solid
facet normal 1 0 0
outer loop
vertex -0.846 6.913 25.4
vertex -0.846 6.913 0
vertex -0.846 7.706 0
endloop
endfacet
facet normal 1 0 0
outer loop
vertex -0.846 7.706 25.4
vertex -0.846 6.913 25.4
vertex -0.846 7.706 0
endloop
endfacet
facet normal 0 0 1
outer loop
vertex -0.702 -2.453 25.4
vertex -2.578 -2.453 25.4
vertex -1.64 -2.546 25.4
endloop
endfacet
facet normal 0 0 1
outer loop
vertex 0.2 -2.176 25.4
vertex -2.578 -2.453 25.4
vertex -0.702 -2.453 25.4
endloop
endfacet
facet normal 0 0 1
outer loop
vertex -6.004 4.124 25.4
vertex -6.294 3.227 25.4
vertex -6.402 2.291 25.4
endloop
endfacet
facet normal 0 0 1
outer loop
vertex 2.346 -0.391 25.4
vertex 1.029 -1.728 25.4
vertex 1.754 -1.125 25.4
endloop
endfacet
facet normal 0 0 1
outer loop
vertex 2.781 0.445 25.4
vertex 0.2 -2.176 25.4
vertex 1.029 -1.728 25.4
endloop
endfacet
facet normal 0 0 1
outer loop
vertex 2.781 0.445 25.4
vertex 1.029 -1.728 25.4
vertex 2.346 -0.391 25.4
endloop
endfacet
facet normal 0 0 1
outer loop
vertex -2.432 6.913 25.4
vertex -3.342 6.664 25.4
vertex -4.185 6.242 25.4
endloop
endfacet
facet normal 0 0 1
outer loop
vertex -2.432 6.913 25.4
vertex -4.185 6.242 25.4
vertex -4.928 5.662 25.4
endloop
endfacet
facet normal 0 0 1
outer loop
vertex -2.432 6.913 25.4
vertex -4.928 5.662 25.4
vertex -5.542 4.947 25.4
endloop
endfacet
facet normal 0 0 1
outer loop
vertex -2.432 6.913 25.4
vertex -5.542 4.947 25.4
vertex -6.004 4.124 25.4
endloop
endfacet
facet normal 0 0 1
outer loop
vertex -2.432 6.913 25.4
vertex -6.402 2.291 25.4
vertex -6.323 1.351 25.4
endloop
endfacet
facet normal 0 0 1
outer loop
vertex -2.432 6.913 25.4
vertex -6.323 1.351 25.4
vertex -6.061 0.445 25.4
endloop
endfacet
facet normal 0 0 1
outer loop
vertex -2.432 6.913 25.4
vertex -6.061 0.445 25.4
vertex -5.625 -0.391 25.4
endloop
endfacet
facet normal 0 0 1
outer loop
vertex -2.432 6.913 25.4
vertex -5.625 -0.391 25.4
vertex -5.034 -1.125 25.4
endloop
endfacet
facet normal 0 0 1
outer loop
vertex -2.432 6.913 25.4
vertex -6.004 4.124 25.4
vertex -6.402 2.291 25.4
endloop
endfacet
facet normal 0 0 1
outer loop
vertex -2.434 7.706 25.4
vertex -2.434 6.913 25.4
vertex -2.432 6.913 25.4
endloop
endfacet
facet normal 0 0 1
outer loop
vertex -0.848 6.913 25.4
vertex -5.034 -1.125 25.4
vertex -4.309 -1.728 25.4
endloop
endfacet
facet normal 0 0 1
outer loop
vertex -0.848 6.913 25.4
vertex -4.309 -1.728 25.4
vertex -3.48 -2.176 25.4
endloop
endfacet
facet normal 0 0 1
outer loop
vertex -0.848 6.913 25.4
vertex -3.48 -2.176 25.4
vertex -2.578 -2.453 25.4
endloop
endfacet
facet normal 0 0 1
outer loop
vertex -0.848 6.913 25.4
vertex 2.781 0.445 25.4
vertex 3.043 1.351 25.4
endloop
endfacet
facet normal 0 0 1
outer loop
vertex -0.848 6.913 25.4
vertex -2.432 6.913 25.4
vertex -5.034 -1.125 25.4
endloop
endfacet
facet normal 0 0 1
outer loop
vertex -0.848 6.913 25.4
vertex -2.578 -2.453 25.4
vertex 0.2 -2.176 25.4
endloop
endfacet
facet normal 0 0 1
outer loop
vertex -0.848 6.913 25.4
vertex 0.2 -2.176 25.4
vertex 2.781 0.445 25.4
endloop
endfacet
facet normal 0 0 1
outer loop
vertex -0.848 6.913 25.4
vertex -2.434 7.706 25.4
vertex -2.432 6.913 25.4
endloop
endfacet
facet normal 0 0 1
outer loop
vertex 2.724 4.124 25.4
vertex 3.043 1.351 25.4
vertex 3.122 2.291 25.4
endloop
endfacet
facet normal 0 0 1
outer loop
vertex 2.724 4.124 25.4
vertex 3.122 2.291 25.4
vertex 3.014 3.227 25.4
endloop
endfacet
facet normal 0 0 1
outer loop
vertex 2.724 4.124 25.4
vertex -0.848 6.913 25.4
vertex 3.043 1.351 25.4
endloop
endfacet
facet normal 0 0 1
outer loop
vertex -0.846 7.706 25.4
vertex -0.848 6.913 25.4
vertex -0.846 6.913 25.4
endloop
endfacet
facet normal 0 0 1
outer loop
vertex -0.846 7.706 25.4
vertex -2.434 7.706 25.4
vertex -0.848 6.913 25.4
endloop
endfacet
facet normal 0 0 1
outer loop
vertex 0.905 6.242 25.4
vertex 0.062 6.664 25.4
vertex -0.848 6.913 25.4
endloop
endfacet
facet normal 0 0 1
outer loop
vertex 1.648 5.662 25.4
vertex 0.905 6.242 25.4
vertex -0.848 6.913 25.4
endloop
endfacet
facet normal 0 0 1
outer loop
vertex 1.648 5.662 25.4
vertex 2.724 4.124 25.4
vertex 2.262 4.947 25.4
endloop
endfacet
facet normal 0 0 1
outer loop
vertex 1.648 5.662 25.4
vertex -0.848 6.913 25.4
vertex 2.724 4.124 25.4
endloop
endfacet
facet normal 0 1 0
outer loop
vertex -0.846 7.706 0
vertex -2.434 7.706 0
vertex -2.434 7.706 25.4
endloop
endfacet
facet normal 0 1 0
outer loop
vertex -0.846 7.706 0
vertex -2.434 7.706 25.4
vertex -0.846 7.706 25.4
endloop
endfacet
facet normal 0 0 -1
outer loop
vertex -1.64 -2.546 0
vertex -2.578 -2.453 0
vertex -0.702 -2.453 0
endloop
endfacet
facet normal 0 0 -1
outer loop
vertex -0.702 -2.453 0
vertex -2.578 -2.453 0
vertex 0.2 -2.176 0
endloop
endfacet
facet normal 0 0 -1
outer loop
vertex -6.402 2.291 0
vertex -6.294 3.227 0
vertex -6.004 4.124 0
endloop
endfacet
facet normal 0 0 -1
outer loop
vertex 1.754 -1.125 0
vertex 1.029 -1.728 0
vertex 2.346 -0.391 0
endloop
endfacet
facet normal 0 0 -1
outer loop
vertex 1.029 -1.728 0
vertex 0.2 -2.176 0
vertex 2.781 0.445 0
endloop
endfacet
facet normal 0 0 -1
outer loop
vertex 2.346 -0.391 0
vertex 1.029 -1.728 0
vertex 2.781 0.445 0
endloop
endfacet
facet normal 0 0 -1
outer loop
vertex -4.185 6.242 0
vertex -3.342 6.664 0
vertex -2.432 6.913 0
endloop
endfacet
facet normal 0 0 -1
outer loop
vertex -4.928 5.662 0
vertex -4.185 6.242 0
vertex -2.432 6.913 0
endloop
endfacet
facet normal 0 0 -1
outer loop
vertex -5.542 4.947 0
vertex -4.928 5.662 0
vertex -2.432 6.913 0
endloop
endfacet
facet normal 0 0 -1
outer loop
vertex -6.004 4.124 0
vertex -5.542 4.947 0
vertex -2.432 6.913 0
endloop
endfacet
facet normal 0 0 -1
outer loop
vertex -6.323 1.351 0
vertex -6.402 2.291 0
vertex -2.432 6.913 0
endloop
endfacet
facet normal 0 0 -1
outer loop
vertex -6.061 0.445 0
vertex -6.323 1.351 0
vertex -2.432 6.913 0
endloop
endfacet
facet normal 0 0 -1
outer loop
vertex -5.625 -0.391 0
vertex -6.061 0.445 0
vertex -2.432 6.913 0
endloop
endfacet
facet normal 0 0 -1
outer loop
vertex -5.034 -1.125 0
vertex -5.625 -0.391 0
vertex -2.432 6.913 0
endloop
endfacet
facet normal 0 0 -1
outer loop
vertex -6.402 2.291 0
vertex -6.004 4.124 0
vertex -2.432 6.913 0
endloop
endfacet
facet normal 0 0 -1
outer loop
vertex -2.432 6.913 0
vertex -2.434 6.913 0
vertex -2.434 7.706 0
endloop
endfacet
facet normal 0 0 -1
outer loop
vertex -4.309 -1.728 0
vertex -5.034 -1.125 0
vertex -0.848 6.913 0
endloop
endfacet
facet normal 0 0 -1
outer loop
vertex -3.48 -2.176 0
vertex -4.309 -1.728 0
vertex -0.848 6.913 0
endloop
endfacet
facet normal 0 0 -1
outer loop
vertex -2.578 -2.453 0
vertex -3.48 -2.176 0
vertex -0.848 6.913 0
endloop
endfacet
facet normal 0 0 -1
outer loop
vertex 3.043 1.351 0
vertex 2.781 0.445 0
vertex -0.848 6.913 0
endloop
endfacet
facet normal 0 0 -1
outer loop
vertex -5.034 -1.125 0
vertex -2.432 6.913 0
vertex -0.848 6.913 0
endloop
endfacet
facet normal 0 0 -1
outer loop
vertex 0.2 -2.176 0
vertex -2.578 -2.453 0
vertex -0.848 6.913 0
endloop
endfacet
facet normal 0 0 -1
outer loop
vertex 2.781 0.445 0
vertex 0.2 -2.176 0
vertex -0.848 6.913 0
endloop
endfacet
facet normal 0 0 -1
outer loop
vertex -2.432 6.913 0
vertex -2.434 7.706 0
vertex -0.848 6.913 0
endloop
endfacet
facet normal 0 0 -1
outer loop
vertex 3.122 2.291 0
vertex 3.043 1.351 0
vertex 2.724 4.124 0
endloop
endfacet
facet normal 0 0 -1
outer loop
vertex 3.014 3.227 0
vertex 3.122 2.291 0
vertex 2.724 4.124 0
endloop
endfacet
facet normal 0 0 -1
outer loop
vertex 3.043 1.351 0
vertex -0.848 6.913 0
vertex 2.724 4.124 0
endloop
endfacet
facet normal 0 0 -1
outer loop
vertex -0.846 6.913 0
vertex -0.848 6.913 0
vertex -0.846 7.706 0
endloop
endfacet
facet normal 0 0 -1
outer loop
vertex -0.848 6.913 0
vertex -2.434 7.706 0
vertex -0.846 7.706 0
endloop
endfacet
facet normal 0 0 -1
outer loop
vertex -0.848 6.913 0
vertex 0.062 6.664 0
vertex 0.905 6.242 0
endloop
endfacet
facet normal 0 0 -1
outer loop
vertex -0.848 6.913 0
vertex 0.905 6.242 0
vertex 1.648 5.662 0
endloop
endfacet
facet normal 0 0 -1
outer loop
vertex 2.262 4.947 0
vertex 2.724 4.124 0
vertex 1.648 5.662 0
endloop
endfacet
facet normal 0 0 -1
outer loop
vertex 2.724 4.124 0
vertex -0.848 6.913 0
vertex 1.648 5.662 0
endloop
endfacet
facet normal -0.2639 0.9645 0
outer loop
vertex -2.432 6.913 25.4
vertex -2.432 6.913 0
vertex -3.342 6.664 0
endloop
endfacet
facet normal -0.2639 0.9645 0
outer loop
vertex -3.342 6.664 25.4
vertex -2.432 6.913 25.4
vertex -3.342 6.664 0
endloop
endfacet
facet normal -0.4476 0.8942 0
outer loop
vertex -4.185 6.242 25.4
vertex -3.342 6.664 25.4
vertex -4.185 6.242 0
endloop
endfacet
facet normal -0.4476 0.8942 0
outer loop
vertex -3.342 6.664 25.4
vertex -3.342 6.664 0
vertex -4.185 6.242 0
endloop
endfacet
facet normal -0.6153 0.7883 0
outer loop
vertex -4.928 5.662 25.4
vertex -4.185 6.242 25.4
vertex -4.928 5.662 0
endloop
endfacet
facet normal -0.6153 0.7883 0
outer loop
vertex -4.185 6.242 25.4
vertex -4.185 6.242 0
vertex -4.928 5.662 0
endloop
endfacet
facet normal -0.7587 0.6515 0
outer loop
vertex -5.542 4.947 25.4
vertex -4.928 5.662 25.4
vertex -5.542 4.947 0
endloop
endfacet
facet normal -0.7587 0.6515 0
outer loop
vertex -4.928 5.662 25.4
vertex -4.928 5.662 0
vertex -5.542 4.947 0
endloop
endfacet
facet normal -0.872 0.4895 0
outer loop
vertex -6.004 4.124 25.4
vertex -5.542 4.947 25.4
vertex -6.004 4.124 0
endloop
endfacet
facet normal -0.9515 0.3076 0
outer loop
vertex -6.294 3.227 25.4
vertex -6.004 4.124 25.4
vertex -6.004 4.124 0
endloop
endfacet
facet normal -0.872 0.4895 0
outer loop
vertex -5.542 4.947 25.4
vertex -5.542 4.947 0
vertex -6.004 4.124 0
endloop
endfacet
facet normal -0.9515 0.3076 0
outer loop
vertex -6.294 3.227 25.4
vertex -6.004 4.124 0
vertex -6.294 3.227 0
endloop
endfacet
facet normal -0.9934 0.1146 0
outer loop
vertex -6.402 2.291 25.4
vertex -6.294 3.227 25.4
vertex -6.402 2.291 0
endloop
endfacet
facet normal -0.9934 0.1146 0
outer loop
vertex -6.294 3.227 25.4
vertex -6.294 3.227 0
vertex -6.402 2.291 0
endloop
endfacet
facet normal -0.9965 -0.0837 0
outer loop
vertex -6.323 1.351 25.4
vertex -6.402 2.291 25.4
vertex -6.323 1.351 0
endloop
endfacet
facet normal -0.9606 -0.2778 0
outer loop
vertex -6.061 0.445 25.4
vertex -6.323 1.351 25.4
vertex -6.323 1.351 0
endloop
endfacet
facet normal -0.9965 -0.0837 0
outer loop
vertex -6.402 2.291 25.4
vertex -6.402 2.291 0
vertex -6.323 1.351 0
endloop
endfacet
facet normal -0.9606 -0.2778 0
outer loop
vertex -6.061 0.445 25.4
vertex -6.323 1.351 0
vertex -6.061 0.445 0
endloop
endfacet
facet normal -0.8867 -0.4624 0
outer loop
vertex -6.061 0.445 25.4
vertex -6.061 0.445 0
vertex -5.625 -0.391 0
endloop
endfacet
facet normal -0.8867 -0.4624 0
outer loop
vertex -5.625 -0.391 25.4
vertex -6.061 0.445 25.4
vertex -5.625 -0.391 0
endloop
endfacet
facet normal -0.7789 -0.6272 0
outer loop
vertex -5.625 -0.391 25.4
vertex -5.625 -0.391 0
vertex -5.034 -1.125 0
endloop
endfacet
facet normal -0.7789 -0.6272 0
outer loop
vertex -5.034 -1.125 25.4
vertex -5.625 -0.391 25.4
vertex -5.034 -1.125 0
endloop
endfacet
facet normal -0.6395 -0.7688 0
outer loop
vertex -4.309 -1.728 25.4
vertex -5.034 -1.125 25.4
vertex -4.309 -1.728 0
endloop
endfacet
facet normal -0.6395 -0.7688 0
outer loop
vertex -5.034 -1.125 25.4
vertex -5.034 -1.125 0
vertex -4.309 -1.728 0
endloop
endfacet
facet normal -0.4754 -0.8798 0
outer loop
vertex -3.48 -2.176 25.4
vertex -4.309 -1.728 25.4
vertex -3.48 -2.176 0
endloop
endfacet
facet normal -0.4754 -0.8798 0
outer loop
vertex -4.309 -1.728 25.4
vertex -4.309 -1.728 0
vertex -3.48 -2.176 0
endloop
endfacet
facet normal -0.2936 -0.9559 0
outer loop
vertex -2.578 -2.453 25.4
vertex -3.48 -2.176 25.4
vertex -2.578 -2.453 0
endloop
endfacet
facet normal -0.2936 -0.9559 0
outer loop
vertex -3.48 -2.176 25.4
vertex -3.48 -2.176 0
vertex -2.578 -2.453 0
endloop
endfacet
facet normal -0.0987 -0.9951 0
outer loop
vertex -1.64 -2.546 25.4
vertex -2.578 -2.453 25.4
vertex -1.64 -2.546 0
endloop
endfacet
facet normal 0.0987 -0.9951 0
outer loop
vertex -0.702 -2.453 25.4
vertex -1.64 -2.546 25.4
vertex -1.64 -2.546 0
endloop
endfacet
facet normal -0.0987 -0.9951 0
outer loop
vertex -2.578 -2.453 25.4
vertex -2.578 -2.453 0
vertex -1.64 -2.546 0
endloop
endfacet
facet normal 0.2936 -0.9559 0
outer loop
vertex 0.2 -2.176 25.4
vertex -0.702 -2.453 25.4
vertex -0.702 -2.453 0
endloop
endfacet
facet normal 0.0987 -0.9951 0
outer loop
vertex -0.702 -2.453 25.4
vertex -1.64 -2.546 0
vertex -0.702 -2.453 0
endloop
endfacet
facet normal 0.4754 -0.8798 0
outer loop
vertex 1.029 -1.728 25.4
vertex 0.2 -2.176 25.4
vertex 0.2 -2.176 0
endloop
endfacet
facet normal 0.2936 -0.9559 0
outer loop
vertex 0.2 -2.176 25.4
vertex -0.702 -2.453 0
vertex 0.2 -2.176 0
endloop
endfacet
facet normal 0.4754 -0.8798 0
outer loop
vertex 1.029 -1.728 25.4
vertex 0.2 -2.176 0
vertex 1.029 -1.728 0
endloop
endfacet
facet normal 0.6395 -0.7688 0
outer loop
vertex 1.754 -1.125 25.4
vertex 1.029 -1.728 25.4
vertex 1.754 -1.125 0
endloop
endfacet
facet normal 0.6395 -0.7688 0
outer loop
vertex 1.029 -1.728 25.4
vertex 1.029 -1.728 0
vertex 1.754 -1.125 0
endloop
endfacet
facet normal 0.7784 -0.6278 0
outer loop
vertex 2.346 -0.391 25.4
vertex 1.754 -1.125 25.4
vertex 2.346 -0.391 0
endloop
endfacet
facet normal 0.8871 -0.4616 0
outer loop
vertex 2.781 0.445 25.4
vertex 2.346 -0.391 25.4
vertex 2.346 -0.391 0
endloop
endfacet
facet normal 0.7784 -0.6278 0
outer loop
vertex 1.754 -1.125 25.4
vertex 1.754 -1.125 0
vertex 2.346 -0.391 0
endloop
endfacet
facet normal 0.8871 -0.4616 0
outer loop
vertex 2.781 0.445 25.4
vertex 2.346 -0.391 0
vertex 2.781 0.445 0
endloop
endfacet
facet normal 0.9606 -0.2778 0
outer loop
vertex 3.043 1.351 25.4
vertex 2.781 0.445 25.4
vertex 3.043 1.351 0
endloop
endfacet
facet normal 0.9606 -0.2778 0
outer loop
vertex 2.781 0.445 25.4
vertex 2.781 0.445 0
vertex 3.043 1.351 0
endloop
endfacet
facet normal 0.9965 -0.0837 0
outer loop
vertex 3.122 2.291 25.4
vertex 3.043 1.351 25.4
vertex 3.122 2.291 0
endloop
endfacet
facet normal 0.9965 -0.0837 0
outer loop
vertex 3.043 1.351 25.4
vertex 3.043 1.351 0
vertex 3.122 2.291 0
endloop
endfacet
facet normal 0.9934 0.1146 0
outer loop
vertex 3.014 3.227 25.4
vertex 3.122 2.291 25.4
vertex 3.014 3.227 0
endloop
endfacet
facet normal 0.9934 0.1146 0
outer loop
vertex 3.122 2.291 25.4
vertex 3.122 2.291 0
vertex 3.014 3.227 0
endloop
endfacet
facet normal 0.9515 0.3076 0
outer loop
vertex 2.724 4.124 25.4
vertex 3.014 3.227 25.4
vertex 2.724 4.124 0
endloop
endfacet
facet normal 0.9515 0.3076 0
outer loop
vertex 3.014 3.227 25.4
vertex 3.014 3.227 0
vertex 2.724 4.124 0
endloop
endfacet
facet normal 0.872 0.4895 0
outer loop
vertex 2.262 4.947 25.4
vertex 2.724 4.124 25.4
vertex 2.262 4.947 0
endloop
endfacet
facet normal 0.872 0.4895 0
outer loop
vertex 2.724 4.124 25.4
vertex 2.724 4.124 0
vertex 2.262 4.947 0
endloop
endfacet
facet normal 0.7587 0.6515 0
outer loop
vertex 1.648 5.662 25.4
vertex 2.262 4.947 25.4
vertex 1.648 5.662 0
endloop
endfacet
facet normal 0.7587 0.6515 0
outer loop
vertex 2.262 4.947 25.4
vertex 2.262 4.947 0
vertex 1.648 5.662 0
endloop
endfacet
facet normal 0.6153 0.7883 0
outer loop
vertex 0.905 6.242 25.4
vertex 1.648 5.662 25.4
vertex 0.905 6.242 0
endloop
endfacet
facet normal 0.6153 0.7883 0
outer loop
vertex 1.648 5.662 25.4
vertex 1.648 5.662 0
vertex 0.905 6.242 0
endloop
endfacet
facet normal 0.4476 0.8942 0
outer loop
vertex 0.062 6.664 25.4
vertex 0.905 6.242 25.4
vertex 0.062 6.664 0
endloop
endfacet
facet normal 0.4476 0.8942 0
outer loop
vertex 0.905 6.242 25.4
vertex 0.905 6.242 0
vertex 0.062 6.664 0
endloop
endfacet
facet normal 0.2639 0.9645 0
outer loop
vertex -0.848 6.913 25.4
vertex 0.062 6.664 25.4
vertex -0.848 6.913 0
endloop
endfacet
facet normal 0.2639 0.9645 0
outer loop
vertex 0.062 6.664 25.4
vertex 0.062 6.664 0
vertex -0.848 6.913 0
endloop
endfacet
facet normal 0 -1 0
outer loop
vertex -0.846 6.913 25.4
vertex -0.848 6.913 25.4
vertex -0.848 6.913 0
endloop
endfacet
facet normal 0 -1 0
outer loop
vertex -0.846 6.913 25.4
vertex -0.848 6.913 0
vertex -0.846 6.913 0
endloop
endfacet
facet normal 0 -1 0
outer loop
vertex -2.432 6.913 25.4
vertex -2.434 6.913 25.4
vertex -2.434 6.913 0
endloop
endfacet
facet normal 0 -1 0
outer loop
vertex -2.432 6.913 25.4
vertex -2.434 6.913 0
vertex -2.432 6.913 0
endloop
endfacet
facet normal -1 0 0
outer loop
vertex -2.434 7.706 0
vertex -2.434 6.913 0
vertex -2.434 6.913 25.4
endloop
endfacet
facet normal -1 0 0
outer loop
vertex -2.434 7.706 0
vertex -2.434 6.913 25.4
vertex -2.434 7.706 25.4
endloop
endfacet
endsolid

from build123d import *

# Parameters (mm, degrees)
SKETCH1_R           = 4.7625
SKETCH1_W           = 1.5875
SKETCH1_H           = 0.79375
BOSS_EXTRUDE1_DEPTH = 25.4


with BuildPart() as part:
    # Sketch1 → Boss-Extrude1 (new body)
    with BuildSketch(Plane.XY):
        with Locations((-1.639930211, 2.216369181)):
            Circle(SKETCH1_R)
        with Locations((-1.639930211, 7.309385865)):
            Rectangle(SKETCH1_W, SKETCH1_H)
    extrude(amount=BOSS_EXTRUDE1_DEPTH)


solid = part.part
